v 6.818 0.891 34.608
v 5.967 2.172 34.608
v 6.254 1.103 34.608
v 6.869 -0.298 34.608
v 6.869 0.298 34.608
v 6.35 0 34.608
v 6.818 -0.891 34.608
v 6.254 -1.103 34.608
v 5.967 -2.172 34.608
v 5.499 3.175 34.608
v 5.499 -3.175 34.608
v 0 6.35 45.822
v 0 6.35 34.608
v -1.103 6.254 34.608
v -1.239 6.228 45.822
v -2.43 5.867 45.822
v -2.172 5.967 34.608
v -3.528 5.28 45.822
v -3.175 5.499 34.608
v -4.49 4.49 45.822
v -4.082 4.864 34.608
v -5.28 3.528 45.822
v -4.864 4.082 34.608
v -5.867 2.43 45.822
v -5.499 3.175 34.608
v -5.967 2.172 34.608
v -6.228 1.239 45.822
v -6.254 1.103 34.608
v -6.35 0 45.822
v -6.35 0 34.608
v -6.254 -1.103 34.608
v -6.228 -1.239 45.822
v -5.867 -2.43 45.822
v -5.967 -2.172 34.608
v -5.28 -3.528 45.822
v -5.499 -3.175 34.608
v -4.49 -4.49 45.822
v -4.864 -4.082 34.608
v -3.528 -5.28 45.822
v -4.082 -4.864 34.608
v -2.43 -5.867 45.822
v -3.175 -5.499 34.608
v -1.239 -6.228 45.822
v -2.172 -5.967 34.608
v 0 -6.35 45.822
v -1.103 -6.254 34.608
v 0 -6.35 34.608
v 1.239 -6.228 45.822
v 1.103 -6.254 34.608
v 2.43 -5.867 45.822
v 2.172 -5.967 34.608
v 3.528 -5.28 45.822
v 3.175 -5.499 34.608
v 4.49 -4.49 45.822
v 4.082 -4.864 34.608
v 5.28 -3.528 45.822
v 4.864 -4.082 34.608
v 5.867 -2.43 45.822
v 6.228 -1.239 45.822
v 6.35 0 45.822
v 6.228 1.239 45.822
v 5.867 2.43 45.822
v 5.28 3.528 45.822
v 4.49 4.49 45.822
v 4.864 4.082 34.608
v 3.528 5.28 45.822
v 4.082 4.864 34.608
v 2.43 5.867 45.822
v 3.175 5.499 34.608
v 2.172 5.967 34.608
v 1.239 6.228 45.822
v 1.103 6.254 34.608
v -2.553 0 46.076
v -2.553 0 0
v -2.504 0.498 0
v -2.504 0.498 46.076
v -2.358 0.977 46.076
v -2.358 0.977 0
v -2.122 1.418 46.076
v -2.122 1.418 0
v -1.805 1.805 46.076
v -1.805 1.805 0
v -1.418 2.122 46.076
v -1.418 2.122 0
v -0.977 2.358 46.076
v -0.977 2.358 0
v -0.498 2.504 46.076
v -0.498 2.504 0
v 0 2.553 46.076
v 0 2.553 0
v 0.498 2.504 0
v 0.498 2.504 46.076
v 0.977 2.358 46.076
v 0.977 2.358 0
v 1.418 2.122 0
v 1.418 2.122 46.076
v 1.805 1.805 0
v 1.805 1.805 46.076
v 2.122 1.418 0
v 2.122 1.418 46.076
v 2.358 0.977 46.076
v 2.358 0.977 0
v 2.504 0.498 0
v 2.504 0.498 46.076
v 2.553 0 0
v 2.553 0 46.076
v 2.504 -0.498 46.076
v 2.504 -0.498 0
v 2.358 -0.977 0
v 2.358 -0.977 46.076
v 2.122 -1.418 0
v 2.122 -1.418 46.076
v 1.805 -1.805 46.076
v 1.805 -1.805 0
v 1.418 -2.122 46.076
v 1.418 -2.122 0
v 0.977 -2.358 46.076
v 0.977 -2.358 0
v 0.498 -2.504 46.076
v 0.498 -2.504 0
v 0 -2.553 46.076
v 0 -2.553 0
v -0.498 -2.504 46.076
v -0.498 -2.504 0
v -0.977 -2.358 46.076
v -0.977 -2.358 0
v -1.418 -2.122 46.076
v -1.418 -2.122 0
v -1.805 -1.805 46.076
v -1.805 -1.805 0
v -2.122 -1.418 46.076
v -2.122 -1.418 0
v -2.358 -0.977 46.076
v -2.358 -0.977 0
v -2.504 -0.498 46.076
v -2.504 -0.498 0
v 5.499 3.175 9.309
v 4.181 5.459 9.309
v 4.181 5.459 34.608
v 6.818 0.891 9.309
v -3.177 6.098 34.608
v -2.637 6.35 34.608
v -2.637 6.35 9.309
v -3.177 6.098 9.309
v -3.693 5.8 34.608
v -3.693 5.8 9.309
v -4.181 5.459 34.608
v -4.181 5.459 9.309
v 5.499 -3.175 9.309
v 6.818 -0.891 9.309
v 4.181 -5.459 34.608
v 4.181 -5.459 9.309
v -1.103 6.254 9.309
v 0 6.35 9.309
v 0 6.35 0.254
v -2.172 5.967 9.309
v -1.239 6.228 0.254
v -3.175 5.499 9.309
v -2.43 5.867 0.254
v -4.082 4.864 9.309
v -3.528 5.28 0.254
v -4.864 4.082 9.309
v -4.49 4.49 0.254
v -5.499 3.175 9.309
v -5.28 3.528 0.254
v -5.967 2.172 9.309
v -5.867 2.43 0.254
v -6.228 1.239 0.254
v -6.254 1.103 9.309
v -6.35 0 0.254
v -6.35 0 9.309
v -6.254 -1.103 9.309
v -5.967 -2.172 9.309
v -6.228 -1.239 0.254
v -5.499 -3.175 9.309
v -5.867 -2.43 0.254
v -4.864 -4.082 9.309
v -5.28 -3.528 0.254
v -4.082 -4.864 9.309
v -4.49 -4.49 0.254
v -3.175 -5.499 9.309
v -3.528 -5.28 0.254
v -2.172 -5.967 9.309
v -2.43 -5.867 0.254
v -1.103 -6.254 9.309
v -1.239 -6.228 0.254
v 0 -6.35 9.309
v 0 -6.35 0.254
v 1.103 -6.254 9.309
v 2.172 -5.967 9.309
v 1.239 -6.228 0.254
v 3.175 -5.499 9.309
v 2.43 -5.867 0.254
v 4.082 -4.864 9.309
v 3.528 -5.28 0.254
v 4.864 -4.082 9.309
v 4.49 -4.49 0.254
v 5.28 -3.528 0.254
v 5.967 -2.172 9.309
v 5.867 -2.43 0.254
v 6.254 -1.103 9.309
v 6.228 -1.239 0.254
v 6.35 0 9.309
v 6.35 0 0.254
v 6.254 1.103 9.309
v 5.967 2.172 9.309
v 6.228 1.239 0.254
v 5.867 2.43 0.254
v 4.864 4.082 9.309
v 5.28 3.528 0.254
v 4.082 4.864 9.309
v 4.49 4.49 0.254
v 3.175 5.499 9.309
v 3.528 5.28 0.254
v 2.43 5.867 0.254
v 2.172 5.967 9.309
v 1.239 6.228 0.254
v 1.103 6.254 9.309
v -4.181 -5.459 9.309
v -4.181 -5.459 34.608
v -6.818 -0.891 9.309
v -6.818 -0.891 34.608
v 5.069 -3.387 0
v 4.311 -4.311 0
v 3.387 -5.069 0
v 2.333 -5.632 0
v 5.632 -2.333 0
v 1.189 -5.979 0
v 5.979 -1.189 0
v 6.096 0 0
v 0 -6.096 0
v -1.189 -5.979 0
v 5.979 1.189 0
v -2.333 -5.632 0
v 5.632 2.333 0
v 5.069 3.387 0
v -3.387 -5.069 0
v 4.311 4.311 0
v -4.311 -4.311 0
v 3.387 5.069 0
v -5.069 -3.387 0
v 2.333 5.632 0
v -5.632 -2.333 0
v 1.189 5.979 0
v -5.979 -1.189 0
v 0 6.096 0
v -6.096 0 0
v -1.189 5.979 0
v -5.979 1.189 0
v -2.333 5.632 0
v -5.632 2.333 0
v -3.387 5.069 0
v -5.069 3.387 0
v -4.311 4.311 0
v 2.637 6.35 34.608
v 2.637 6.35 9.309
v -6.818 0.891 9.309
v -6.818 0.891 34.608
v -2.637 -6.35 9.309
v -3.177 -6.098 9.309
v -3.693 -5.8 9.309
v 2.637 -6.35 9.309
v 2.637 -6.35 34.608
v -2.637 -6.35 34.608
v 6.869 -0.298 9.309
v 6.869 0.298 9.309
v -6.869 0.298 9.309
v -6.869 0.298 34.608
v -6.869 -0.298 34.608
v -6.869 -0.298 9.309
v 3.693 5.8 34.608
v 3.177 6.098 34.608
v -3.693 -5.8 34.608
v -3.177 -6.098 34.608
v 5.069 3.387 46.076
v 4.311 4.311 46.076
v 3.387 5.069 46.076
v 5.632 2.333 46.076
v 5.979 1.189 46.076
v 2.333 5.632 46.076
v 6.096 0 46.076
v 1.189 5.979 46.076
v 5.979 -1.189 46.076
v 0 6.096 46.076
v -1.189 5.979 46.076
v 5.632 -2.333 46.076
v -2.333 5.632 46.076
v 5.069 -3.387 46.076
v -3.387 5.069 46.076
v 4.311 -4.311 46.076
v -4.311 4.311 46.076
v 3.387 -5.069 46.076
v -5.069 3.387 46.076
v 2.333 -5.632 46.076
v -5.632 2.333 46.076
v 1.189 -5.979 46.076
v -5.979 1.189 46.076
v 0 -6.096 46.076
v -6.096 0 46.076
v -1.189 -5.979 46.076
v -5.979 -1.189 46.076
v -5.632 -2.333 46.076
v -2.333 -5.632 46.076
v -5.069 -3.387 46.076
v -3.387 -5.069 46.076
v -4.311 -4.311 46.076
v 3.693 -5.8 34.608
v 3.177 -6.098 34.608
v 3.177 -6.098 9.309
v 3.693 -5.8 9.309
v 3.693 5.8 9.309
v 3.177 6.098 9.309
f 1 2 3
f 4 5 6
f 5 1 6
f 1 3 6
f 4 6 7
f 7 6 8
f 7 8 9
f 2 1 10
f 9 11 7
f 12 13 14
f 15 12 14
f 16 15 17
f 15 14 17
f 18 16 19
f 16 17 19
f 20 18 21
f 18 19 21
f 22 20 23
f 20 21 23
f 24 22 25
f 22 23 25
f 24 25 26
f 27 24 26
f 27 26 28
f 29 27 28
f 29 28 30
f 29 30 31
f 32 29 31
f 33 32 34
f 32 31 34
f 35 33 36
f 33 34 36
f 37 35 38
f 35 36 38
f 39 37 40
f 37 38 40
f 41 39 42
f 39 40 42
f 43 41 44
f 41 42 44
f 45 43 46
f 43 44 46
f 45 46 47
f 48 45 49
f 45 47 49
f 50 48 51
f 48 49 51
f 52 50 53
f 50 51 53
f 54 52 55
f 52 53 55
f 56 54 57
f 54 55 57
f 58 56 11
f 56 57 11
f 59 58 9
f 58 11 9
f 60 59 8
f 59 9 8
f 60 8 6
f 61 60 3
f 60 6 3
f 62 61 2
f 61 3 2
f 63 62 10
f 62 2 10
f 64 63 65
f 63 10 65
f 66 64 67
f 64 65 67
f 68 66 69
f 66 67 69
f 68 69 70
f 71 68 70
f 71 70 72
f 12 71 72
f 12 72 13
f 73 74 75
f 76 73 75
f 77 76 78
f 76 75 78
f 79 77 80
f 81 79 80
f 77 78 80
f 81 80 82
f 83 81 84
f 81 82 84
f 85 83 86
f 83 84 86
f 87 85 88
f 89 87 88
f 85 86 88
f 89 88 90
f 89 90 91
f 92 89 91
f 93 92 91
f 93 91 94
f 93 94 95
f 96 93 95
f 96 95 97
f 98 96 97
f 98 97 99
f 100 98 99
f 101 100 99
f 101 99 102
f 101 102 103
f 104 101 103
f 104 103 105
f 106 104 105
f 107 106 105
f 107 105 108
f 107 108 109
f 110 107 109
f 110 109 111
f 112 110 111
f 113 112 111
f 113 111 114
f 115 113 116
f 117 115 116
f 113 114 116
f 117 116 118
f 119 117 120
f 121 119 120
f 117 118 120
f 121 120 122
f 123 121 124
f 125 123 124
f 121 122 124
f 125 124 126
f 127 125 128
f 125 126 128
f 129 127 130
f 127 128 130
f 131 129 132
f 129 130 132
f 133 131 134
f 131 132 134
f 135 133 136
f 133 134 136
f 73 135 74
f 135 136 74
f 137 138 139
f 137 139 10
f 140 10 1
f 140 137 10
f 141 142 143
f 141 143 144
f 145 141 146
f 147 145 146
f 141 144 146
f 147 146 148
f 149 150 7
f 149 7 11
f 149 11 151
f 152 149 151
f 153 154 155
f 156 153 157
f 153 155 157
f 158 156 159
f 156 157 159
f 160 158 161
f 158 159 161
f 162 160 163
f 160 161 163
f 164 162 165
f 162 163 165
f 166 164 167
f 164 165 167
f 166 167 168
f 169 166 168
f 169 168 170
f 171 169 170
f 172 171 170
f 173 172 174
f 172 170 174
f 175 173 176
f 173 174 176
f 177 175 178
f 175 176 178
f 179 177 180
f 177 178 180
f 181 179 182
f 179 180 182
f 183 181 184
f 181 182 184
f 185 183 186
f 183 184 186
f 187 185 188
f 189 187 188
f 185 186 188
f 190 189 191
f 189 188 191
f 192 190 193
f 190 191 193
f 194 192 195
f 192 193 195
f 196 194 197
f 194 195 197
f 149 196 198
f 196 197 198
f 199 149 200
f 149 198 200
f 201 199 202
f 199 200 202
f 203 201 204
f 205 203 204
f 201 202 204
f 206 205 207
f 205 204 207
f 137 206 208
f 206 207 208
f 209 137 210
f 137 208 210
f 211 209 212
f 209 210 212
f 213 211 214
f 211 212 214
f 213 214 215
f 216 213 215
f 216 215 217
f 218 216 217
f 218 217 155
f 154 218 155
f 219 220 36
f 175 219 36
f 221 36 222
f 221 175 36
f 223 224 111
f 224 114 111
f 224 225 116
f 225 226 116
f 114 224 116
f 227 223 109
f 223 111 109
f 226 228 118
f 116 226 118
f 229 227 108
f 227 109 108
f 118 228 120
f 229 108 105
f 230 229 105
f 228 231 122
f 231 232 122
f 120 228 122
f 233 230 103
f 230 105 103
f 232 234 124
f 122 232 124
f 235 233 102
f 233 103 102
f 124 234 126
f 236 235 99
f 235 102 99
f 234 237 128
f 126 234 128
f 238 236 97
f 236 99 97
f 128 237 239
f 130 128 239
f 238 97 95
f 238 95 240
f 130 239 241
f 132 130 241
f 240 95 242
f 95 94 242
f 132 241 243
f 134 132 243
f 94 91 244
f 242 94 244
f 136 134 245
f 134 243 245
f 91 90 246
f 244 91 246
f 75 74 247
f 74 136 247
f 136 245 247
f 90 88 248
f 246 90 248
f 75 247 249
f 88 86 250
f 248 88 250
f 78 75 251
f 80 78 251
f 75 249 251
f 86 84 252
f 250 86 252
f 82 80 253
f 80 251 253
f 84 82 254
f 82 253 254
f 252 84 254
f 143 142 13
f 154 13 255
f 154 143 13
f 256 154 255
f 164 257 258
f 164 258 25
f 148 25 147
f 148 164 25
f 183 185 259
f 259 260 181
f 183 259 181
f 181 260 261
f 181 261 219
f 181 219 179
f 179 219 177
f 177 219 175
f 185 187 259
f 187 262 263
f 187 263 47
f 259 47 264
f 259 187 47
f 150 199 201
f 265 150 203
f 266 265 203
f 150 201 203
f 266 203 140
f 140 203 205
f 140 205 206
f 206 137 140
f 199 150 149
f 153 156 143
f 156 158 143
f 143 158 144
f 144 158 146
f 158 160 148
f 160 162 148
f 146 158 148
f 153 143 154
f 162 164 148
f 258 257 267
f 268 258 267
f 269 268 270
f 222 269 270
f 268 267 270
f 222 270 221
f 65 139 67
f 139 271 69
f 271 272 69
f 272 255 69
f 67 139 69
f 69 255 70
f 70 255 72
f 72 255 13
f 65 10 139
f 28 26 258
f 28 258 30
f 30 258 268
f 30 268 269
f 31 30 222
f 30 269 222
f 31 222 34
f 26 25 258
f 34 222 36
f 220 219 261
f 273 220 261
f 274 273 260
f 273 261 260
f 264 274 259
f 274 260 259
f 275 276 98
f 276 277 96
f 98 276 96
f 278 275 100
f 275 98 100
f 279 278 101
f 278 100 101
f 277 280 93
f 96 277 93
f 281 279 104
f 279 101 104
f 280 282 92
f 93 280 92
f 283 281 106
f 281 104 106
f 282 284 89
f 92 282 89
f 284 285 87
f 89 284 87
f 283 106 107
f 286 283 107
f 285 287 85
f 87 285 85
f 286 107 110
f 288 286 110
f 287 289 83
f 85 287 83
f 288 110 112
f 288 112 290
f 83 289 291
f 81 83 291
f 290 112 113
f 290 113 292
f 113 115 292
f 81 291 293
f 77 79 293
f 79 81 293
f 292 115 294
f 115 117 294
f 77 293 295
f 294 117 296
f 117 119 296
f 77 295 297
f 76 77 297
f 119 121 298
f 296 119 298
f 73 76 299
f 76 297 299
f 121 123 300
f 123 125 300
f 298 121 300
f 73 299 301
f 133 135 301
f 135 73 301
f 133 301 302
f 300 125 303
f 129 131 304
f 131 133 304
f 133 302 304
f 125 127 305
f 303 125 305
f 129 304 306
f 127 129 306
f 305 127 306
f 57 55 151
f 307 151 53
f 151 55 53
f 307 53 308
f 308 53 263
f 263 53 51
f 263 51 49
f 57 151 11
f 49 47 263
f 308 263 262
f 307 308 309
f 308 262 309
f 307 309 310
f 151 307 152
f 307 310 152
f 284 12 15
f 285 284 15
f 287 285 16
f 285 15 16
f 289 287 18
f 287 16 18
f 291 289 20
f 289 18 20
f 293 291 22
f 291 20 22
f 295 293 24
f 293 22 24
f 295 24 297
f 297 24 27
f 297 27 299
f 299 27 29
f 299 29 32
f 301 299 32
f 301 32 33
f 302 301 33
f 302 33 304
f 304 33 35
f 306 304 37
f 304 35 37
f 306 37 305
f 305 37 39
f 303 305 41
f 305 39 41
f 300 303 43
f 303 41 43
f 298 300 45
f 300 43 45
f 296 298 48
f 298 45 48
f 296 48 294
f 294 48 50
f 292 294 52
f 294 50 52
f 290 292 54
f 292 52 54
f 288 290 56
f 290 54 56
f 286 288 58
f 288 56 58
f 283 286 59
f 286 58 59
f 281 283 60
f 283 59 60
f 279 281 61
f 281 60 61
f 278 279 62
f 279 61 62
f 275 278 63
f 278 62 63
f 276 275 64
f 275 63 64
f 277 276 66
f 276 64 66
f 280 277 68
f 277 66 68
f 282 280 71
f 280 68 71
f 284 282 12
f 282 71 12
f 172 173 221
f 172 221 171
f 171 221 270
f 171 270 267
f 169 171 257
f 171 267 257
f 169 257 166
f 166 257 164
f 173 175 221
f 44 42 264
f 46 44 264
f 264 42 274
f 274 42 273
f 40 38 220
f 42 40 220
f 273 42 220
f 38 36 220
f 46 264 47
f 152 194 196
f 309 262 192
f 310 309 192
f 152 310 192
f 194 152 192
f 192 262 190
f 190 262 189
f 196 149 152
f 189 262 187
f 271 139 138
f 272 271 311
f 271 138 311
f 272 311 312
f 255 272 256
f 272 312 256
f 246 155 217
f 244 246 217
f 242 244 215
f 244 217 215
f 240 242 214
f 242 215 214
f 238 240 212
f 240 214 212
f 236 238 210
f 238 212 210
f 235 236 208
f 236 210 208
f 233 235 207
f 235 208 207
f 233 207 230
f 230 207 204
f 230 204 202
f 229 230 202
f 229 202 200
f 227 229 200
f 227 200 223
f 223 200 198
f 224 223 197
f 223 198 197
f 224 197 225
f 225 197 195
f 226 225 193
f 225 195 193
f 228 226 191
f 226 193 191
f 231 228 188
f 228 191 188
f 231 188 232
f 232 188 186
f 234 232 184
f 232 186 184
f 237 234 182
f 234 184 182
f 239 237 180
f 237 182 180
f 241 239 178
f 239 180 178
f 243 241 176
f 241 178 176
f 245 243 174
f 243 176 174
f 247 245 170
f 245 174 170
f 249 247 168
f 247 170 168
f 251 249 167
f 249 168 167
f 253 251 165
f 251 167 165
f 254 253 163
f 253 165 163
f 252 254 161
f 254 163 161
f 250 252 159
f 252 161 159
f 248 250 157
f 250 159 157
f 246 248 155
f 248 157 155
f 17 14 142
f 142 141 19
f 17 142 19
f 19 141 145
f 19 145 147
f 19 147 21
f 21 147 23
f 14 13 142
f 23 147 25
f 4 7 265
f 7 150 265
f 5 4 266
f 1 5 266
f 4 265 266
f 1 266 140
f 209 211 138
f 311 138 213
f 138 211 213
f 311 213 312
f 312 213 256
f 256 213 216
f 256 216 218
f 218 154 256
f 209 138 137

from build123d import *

# Parameters (mm, degrees)
SKETCH2_OUTSIDE_W  = 25.754
SKETCH2_OUTSIDE_H  = 25.754
SKETCH2_OUTSIDE_R  = 2.5527
CUT_EXTRUDE3_DEPTH = 48.090483291
CHAMFER1_SIZE      = 0.254


with BuildPart() as part:
    # Sketch1 → Revolve1 (revolve)
    with BuildSketch(Plane(origin=(0, 0, 0), x_dir=(0, 0, -1), z_dir=(1, 0, 0))):
        Polygon((0, 0), (-46.0756, 0), (-46.0756, 6.35), (-34.6075, 6.35), (-34.6075, 6.87578), (-9.3091, 6.87578), (-9.3091, 6.35), (0, 6.35), align=None)
    revolve(axis=Axis((0, 0, -29.540514156), (0, 0, 1)))

    # Sketch2 outside → Cut-Extrude3 (cut, through all)
    # profile 1 of 2: a face of its own
    with BuildSketch(Plane(origin=(0, 0, 0), x_dir=(-1, 0, 0), z_dir=(0, 0, -1))):
        Rectangle(SKETCH2_OUTSIDE_W, SKETCH2_OUTSIDE_H)
        Polygon((3.666174209, -6.35), (7.332348419, 0), (3.666174209, 6.35), (-3.666174209, 6.35), (-7.332348419, 0), (-3.666174209, -6.35), align=None, mode=Mode.SUBTRACT)
    # profile 2 of 2: a face of its own
    with BuildSketch(Plane(origin=(0, 0, 0), x_dir=(-1, 0, 0), z_dir=(0, 0, -1))):
        Circle(SKETCH2_OUTSIDE_R)
    extrude(amount=-CUT_EXTRUDE3_DEPTH, mode=Mode.SUBTRACT)

    # Chamfer1
    chamfer1_edges = [part.edges().sort_by_distance(p)[0] for p in [
        (0, -6.35, 0),
        (0, -6.35, 46.0756),
    ]]
    chamfer(chamfer1_edges, length=CHAMFER1_SIZE)


solid = part.part
